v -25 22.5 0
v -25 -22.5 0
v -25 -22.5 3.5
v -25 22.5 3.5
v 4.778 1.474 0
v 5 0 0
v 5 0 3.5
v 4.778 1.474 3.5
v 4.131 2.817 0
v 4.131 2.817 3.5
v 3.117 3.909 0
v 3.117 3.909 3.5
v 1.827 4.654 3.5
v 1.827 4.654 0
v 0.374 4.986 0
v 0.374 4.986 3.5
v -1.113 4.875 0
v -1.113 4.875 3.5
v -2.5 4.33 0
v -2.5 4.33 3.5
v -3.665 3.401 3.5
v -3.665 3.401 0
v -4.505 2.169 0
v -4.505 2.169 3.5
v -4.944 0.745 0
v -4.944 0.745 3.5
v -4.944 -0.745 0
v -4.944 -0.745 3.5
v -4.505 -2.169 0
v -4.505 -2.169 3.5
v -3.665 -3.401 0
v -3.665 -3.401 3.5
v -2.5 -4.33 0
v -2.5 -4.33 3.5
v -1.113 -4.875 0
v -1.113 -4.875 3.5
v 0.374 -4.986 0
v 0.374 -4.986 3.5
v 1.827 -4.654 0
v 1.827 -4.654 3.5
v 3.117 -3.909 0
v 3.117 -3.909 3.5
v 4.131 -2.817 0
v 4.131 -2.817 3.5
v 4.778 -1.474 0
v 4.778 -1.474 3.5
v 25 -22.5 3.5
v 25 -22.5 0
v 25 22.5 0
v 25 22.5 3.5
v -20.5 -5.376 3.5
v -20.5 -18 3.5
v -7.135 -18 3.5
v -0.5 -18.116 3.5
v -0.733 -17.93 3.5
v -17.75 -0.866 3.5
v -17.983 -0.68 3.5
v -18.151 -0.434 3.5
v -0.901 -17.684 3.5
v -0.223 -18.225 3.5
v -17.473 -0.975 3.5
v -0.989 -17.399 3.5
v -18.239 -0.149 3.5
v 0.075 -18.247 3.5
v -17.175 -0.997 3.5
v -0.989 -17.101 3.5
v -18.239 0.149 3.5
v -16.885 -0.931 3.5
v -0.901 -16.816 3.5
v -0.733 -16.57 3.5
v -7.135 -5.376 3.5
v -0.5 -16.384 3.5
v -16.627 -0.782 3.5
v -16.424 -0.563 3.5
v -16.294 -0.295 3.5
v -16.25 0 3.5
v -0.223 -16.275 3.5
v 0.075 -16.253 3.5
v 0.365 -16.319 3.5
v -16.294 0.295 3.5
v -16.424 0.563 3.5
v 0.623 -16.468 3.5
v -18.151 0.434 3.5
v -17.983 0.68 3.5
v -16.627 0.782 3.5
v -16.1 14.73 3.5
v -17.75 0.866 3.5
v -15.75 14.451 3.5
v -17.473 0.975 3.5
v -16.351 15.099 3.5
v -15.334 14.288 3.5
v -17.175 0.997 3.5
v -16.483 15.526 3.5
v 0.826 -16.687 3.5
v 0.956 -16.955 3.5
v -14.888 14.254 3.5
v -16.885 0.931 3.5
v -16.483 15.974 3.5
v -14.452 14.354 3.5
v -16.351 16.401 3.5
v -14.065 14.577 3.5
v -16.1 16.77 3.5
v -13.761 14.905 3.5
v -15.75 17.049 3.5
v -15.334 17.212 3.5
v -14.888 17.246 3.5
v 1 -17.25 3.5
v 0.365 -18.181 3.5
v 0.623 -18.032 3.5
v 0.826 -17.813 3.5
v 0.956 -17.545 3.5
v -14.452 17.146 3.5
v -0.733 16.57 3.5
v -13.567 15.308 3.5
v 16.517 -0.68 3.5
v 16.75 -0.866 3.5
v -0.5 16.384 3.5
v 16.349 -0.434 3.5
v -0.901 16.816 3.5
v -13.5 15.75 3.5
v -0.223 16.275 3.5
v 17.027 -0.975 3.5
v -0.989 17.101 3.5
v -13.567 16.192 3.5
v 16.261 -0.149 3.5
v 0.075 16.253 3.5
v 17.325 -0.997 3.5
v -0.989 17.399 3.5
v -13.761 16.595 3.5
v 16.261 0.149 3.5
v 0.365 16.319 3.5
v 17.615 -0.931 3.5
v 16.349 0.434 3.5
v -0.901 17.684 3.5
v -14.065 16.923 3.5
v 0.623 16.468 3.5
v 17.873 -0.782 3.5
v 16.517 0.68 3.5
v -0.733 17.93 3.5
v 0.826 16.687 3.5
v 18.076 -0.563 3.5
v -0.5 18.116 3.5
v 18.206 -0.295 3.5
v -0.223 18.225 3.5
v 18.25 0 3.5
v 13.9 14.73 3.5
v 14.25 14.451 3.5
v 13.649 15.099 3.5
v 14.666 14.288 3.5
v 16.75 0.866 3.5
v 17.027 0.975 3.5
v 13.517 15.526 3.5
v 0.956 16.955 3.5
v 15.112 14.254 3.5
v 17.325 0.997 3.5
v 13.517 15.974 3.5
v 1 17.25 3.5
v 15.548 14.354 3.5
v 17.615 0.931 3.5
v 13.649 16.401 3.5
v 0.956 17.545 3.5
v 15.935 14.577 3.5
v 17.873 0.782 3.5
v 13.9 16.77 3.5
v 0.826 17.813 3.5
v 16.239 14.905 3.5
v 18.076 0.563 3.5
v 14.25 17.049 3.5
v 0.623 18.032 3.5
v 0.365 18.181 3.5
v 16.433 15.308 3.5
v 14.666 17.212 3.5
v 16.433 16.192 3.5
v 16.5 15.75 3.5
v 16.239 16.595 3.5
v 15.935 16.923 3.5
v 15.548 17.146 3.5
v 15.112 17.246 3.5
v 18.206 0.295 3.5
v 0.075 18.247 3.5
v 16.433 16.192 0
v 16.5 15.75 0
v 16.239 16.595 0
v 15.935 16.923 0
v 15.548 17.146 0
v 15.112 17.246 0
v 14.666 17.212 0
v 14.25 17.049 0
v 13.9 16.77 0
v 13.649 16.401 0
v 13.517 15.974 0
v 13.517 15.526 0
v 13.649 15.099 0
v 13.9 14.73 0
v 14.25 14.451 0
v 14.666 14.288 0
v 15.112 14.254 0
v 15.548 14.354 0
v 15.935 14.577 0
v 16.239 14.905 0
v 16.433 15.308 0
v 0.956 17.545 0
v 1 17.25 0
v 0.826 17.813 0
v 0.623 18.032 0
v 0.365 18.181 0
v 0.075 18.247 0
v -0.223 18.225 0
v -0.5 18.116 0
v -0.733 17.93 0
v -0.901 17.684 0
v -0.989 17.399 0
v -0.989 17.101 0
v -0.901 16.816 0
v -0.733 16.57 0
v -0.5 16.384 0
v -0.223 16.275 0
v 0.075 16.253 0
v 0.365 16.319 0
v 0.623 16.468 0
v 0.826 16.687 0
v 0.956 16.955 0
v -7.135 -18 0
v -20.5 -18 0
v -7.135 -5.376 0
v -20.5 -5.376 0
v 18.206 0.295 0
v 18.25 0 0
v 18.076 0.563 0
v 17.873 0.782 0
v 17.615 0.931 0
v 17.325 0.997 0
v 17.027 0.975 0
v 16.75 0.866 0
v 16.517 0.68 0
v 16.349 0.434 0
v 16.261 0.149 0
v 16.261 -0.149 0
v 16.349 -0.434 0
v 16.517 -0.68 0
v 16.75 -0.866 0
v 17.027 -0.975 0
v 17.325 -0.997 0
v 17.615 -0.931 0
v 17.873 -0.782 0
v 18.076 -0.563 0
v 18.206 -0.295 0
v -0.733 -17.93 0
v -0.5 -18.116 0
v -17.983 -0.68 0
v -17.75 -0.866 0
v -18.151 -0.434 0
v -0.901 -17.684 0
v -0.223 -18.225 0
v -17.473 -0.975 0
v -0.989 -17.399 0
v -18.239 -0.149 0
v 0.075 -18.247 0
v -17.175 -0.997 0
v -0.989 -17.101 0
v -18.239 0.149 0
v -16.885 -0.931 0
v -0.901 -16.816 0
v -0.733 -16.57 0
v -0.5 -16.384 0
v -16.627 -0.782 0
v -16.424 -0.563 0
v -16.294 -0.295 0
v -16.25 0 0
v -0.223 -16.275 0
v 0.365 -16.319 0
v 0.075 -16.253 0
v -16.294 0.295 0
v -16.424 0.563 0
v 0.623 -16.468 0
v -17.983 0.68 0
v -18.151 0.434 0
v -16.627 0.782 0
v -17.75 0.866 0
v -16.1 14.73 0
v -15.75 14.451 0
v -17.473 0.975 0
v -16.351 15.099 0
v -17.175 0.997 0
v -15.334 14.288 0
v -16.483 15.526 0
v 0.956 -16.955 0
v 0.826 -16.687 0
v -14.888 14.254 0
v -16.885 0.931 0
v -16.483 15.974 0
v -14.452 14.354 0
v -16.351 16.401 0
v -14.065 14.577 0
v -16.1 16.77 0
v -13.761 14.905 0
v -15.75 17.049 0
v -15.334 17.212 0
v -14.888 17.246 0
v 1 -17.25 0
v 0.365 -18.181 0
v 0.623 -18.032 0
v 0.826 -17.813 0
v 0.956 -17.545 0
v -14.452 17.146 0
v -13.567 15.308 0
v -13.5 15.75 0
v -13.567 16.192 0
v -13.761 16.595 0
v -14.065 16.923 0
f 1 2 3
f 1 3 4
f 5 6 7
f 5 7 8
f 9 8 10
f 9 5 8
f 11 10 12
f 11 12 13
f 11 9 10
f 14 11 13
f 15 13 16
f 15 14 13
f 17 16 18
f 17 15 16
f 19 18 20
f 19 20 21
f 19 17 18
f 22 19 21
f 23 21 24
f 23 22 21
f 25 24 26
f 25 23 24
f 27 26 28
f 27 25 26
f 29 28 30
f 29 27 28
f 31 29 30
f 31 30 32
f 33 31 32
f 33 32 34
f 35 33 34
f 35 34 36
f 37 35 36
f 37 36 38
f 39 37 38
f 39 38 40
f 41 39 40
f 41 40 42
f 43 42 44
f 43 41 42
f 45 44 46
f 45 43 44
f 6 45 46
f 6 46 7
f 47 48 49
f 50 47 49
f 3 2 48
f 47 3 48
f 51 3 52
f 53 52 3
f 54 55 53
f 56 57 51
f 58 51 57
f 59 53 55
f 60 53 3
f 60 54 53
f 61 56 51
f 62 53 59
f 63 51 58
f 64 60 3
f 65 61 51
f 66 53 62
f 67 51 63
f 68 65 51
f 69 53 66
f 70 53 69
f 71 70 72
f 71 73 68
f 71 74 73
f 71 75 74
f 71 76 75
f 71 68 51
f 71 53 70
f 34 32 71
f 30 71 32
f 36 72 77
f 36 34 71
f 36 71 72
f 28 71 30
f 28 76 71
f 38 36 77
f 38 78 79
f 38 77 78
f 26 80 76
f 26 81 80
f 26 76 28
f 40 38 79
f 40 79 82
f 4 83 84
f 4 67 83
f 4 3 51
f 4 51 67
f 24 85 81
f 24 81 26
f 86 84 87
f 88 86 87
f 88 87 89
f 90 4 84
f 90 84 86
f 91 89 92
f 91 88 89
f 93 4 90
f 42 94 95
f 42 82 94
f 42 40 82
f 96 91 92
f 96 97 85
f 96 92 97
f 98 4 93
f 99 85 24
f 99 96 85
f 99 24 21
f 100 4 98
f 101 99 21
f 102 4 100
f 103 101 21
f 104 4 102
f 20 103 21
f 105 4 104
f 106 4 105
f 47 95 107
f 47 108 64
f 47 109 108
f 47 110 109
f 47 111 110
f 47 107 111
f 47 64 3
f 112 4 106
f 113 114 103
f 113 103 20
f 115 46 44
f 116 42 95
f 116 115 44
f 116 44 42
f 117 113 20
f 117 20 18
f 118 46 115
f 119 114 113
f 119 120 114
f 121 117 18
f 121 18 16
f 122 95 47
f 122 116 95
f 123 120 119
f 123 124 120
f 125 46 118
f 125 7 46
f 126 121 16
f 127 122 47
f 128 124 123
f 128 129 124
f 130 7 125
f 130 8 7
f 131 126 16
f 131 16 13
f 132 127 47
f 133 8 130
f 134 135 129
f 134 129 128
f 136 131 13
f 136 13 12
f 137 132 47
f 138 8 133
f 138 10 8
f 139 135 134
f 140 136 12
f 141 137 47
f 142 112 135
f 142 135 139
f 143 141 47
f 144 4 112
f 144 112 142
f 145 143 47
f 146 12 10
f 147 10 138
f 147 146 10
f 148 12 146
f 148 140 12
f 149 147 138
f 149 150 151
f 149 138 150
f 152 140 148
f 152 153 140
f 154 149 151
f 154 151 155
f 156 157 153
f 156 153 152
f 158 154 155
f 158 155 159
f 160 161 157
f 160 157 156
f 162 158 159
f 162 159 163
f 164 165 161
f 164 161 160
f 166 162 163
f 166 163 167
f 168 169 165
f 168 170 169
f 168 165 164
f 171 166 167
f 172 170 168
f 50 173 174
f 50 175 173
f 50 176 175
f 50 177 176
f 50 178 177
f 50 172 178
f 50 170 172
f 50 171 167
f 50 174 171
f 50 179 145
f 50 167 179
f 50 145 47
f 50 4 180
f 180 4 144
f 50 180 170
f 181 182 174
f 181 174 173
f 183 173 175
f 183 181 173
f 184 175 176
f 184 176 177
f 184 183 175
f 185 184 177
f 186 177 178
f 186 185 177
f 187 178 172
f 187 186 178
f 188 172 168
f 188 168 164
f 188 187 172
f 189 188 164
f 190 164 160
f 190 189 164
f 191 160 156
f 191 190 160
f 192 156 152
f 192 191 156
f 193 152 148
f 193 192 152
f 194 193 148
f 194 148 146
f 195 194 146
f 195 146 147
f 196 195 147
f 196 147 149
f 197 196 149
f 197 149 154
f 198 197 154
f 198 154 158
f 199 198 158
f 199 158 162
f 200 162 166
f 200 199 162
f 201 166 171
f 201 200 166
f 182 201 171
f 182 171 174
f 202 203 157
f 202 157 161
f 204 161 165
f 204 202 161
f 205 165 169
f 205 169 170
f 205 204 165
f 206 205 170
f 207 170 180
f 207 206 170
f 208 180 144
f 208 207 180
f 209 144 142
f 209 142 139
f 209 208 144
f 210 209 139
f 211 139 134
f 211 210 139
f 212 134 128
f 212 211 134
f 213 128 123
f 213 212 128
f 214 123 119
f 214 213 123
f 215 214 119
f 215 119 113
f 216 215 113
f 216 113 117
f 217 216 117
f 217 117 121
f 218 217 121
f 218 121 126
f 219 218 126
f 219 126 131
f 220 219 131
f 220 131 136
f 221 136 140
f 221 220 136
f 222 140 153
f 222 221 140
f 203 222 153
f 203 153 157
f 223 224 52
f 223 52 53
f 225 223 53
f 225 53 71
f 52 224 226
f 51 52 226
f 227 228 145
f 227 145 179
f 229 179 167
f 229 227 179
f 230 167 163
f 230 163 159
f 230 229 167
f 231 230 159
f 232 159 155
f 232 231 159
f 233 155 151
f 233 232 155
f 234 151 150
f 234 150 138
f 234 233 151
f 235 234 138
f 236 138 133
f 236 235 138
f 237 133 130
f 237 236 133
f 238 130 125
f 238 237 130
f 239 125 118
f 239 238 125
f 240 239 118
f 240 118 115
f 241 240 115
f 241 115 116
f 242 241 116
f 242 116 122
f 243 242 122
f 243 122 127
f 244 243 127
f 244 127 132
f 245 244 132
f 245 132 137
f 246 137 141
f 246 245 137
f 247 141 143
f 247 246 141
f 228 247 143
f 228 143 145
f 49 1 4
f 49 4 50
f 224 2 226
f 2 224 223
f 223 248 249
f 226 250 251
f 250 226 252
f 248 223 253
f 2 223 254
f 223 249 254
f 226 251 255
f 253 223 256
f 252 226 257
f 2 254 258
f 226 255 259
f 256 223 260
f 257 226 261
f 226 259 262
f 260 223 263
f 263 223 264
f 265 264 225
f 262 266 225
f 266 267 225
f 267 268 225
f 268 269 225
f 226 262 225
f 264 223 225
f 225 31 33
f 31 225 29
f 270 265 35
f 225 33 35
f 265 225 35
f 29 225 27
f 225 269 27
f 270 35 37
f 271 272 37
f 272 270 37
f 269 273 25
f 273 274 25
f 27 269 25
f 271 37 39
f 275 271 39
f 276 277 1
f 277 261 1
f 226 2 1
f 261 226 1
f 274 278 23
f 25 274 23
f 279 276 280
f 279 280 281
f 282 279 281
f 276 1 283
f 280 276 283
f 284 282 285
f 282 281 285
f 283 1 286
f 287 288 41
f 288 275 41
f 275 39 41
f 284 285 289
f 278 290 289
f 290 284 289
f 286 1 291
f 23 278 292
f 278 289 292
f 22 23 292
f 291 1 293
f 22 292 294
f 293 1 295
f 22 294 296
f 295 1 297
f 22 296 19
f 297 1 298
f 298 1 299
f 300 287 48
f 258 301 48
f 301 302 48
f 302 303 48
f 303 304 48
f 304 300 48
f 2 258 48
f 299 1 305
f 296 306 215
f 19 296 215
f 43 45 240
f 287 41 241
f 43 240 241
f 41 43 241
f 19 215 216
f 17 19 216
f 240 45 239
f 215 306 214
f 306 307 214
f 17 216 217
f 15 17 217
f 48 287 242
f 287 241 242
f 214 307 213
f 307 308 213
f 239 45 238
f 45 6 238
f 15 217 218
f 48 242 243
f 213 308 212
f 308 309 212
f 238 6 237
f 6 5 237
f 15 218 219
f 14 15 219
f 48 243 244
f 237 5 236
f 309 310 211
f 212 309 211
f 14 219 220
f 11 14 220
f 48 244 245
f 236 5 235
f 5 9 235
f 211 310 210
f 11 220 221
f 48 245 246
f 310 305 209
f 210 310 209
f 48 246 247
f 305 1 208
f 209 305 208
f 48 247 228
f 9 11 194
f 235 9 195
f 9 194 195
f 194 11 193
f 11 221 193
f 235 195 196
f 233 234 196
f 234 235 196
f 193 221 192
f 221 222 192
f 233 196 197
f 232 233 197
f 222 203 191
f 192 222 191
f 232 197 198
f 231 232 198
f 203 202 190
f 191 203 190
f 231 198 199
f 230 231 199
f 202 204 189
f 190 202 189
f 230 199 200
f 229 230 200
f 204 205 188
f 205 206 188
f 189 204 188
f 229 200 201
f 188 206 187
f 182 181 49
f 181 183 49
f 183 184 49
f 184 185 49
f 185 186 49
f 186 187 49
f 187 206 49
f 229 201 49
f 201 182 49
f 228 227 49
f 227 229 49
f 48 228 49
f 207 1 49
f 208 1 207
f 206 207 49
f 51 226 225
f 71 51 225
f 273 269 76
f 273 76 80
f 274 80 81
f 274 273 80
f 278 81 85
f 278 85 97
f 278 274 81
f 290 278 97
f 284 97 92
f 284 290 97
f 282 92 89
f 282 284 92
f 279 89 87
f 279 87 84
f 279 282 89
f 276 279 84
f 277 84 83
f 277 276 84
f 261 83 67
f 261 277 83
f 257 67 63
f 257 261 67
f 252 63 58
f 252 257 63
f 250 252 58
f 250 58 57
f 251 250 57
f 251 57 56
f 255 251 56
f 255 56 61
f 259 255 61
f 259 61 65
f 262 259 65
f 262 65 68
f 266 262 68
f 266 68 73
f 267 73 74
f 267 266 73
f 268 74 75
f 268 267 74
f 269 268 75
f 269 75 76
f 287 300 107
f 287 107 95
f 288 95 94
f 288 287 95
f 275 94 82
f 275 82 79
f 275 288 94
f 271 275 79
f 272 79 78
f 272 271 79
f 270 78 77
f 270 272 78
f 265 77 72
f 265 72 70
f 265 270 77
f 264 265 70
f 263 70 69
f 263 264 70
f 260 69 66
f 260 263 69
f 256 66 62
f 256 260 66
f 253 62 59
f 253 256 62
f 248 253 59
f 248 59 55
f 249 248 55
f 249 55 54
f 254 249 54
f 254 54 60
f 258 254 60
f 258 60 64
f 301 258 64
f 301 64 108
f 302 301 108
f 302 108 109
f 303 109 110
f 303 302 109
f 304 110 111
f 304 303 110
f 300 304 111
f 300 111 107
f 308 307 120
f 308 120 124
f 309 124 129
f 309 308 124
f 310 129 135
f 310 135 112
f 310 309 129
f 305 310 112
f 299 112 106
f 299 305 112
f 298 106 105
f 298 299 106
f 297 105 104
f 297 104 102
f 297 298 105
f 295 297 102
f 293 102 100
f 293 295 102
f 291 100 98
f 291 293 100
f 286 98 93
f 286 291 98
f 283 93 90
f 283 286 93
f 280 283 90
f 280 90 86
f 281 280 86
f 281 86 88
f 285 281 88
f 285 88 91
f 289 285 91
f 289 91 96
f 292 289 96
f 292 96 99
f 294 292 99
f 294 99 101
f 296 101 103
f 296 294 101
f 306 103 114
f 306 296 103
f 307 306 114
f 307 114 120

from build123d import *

# Parameters (mm, degrees)
F0_W     = 50
F0_H     = 45
F0_W_2   = 13.365347
F0_H_2   = 12.623919
F0_R     = 1
F0_R_2   = 1.5
F0_R_3   = 5
F1_DEPTH = 3.5


with BuildPart() as f1:
    # F0 (on Top) → F1 (new body)
    with BuildSketch(Plane.XY):
        Rectangle(F0_W, F0_H)
        with Locations((-13.817327, -11.68804)):
            Rectangle(F0_W_2, F0_H_2, mode=Mode.SUBTRACT)
        with Locations((0, -17.25)):
            Circle(F0_R, mode=Mode.SUBTRACT)
        with Locations((-17.25, 0)):
            Circle(F0_R, mode=Mode.SUBTRACT)
        with Locations((-15, 15.75)):
            Circle(F0_R_2, mode=Mode.SUBTRACT)
        Circle(F0_R_3, mode=Mode.SUBTRACT)
        with Locations((17.25, 0)):
            Circle(F0_R, mode=Mode.SUBTRACT)
        with Locations((0, 17.25)):
            Circle(F0_R, mode=Mode.SUBTRACT)
        with Locations((15, 15.75)):
            Circle(F0_R_2, mode=Mode.SUBTRACT)
    extrude(amount=F1_DEPTH)


solid = f1.part
